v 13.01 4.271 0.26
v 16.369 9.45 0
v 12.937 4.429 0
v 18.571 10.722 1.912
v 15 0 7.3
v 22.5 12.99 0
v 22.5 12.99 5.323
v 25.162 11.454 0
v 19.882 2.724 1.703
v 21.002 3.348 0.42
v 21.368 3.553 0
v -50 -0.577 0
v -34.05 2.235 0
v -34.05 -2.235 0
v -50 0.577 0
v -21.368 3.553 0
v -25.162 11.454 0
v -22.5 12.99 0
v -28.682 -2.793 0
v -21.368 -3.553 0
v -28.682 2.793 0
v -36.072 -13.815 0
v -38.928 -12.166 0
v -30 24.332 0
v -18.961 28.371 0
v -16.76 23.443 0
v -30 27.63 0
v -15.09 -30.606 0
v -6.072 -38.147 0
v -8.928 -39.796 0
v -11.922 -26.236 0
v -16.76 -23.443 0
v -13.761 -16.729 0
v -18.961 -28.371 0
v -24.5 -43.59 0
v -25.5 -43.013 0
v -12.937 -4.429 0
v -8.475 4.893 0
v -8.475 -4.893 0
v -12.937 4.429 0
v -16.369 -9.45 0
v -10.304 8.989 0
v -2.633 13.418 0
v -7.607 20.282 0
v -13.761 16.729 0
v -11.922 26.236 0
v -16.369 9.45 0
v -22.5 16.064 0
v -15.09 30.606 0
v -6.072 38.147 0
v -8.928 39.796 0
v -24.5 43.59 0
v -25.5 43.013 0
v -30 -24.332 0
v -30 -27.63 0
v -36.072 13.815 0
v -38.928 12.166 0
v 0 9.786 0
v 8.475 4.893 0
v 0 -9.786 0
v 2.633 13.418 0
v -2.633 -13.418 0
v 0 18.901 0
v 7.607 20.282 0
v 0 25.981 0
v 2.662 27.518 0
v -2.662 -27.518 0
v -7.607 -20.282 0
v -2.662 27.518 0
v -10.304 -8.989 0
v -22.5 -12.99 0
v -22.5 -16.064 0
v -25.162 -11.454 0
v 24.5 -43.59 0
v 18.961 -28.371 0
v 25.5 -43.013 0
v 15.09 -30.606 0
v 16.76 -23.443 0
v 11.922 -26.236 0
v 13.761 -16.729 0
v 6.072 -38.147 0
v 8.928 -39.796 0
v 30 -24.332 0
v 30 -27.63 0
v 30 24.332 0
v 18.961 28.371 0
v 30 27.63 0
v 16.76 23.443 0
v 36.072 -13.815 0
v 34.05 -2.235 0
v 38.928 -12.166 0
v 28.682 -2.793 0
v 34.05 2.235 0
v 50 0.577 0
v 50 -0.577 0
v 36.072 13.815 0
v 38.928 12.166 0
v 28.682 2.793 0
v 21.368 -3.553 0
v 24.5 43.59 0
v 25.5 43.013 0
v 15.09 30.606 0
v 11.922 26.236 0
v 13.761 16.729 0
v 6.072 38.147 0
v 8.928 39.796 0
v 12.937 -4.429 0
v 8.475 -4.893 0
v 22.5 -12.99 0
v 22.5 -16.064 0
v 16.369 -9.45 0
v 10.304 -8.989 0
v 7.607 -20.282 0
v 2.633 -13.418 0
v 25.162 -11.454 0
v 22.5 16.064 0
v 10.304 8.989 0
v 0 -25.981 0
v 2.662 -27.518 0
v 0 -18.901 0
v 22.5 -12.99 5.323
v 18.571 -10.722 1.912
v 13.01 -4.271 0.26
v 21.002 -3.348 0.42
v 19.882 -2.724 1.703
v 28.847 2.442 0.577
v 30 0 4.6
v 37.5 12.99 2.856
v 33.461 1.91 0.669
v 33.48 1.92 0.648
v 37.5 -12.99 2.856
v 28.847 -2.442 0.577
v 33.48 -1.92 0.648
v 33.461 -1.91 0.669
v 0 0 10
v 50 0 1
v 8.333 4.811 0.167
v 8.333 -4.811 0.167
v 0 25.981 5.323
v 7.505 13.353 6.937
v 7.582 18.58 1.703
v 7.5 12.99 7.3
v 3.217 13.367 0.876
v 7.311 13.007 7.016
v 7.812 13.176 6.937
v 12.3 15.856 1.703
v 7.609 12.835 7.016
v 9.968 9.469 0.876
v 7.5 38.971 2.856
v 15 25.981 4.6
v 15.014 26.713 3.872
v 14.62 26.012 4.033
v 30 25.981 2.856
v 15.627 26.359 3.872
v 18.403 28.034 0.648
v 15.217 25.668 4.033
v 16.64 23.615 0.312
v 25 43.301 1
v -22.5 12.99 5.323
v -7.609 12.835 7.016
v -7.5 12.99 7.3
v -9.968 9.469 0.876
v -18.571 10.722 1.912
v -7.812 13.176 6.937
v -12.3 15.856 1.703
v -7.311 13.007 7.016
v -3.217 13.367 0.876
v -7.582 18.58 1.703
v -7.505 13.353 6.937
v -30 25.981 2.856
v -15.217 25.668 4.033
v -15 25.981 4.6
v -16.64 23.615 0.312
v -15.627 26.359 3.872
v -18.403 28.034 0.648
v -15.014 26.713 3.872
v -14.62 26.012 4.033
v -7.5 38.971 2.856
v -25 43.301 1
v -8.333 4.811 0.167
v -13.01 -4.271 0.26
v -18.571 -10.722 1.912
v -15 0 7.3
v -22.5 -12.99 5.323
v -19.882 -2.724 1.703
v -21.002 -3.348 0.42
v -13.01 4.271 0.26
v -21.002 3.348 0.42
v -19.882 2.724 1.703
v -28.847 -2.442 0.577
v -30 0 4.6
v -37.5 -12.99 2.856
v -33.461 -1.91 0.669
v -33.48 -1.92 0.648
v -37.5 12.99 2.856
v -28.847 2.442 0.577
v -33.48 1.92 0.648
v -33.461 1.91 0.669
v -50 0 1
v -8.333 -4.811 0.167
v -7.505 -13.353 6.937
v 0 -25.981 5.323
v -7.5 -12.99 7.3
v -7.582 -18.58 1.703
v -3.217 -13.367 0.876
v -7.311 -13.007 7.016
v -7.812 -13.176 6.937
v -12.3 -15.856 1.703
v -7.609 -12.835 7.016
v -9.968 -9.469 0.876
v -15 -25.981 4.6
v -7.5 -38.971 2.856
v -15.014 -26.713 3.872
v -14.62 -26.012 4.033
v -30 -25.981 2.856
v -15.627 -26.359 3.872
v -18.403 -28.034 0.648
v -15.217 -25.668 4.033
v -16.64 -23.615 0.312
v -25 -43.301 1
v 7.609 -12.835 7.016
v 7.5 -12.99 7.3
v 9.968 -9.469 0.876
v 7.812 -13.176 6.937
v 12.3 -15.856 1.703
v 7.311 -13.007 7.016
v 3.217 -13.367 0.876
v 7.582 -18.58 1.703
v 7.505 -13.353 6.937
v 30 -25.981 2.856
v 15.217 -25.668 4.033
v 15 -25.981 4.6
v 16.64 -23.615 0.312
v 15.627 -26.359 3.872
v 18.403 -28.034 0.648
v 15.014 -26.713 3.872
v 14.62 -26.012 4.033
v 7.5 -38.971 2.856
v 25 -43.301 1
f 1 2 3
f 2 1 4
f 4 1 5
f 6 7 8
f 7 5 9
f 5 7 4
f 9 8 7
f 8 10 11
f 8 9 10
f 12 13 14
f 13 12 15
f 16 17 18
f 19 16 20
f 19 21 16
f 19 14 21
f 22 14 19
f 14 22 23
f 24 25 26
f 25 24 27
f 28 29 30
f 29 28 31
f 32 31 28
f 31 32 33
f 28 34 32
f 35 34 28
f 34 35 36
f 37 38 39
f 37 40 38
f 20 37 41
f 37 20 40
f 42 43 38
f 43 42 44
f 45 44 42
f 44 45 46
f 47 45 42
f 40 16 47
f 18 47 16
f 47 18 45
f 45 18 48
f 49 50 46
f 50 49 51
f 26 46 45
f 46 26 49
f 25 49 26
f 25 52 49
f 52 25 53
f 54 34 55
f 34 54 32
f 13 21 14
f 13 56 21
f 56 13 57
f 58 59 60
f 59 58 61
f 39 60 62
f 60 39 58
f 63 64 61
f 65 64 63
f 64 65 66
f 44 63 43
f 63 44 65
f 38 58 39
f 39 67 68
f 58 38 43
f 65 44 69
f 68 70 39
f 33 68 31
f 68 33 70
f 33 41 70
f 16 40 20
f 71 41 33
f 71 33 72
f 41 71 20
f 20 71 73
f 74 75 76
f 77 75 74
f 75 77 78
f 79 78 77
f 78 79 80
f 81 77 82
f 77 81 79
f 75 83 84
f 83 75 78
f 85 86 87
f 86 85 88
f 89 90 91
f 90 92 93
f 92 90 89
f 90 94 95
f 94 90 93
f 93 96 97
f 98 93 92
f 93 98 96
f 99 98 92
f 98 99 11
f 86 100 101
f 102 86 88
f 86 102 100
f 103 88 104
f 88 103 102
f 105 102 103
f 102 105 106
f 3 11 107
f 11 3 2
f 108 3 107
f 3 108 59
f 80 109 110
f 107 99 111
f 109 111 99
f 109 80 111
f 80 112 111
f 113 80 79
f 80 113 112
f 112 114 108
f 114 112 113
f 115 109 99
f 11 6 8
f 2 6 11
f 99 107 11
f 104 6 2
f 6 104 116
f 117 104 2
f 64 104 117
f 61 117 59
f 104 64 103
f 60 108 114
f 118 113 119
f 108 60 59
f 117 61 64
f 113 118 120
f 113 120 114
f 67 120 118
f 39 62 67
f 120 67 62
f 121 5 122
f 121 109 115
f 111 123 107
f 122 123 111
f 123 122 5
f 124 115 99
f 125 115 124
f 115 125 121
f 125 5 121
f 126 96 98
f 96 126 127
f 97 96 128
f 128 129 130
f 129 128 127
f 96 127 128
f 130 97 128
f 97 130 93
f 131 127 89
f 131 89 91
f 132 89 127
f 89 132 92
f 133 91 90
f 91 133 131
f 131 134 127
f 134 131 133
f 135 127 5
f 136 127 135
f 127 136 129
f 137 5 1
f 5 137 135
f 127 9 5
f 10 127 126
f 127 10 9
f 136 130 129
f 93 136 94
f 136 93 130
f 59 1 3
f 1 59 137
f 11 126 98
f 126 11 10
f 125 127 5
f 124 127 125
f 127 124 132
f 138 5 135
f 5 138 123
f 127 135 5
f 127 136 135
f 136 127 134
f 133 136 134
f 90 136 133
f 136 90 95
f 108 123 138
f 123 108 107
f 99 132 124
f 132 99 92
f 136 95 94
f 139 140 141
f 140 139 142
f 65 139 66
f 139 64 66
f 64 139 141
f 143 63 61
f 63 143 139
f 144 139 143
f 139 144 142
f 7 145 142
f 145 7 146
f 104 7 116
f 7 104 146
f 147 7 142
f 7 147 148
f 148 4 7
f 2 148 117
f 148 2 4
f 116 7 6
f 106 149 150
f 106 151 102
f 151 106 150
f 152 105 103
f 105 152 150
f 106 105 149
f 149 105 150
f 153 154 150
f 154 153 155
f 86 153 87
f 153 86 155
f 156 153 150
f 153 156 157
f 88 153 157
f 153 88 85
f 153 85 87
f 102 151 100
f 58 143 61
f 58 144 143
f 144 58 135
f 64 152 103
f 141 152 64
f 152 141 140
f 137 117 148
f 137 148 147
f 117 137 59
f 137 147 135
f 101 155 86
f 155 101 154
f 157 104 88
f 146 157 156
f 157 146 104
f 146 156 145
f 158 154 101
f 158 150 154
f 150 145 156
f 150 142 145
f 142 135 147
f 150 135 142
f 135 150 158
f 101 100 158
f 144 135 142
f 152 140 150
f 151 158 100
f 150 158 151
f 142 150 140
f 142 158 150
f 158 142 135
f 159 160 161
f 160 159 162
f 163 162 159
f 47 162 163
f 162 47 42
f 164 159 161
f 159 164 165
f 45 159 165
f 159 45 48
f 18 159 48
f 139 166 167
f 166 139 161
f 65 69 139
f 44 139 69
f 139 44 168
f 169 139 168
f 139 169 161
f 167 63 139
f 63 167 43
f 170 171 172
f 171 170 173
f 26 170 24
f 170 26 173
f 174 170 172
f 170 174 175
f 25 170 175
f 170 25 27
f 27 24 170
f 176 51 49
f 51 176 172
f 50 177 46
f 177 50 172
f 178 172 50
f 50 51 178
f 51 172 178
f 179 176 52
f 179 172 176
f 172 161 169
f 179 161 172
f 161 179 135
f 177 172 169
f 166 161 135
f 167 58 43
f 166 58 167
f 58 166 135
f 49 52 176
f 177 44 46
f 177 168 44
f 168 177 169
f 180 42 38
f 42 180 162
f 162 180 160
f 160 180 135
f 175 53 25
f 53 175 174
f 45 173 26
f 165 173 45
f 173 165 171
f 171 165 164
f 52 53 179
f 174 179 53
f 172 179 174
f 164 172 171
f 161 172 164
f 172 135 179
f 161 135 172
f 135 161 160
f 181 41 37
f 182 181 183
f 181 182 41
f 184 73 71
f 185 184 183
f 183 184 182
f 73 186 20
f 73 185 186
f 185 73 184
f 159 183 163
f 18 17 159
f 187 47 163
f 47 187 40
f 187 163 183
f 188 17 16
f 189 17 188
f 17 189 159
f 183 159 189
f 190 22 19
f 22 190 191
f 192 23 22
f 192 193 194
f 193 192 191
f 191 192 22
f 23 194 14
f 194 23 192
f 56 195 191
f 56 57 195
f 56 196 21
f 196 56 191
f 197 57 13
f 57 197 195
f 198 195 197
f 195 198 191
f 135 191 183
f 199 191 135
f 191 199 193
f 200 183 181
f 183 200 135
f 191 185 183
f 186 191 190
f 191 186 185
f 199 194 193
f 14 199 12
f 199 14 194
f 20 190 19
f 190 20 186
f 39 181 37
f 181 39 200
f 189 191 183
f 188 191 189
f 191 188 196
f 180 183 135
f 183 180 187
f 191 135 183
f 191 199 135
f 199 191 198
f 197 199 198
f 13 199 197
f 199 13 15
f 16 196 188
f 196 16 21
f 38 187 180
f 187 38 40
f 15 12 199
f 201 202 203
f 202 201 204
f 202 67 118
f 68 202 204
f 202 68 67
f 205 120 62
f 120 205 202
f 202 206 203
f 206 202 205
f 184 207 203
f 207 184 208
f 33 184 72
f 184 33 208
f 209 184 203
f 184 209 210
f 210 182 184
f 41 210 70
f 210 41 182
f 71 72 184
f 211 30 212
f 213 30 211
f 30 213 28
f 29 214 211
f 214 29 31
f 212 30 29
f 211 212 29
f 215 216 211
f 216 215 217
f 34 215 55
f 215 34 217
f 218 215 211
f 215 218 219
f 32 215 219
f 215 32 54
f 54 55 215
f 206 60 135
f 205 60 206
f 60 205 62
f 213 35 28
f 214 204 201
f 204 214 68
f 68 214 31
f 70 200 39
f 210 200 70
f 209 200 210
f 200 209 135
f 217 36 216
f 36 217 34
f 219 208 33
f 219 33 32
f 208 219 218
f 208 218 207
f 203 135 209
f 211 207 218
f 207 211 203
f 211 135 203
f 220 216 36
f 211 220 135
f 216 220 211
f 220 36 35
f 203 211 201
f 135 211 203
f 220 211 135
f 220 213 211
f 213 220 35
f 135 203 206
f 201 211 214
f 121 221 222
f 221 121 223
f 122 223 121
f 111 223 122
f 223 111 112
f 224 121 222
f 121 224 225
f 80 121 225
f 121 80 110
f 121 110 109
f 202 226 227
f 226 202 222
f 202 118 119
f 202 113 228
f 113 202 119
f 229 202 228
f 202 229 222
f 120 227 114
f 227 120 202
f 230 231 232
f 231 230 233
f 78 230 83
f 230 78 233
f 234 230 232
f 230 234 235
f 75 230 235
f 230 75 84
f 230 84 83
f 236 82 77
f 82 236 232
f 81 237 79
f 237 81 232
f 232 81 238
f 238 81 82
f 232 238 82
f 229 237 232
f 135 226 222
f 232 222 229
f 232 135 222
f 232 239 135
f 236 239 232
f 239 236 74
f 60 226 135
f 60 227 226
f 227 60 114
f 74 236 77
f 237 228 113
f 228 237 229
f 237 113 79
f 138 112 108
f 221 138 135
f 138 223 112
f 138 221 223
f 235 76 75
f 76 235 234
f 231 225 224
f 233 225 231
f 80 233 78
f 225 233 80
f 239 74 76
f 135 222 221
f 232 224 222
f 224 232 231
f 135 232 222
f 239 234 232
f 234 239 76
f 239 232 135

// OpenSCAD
// Snowflake generator

module flake(radius, base) {
  for (i = [0 : 5]) {
    spike3([0, 0], 60 * i, radius, base);
  }
}

module spike3(pos, dir, len, side) {
  echo("Arm:", pos, len, side);
  spike(pos, dir, len, side);
  assign(child = pos + len * 0.3 * unit(dir)) {
    spike(child, dir + 60, len * 0.2, side * 0.7);
    spike(child, dir - 60, len * 0.2, side * 0.7);
  }
  assign(child = pos + len * 0.6 * unit(dir)) {
    spike2(child, dir + 60, len * 0.3, side * 0.4);
    spike2(child, dir - 60, len * 0.3, side * 0.4);
  }
}

// Recursion not working????
module spike2(pos, dir, len, side) {
  echo("Arm2:", pos, len, side);
  spike(pos, dir, len, side);
  assign(child = pos + len * 0.5 * unit(dir)) {
    spike(child, dir + 60, len * 0.3, side * 0.5);
    spike(child, dir - 60, len * 0.3, side * 0.5);
  }
}

module spike(pos, dir, len, side) {
  // Unit triangle extended 1 unit along x axis.
  //
  //     2---3   x
  //    / \ /   /
  //   1---0   -->-y

  translate([pos[0], pos[1], 0])
    rotate(dir, v=[0, 0, 1])
      scale([len, side, side])
  polyhedron(
    points=[
      [0, -0.5, 0], [0, 0.5, 0], [0, 0, sin(60)], [1, 0, 0]
    ],
    triangles=[
      [0, 1, 2], [0, 2, 3], [0, 3, 1], [1, 3, 2]
    ]
  );
}

MAX_HEIGHT = 10;
MIN_HEIGHT = 1;
RADIUS = 50;

module flake2(radius, base) {
  for (i = [0 : 5]) {
    hex3([0, 0], 60 * i, radius, base);
  }
}

module hex3(pos, dir, len, side) {
  line(pos, dir, len);
  assign(child = pos + len * 0.3 * unit(dir)) {
    line(child, dir + 60, len * 0.3);
    line(child, dir - 60, len * 0.3);
  }
  assign(child = pos + len * 0.6 * unit(dir)) {
    line(child, dir + 60, len * 0.3);
    line(child, dir - 60, len * 0.3);
  }
}

// Draw a wedge-shaped line scaled to gradient from center.
module line(pos, dir, len) {
  // Unit triangle extended 1 unit along x axis.
  //           5
  //          / \
  //     2   4-- 3
  //    / \
  //   1---0
  h1 = weighted(dist(pos) / RADIUS, MAX_HEIGHT, MIN_HEIGHT);
  s1 = h1 / sin(60);
  pos2 = pos + len * unit(dir);
  h2 = weighted(dist(pos2) / RADIUS, MAX_HEIGHT, MIN_HEIGHT);
  s2 = h2 / sin(60);
  translate([pos[0], pos[1], 0])
    rotate(dir, v=[0, 0, 1])
  polyhedron(
    points=[
      [0, -s1 / 2, 0], [0, s1 / 2, 0], [0, 0, h1],
      [len, -s2 / 2, 0], [len, s2 / 2, 0], [len, 0, h2]
    ],
    triangles=[
      [0, 1, 2],
      [0, 2, 5], [0, 5, 3],
      [0, 3, 4], [0, 4, 1],
      [1, 4, 5], [1, 5, 2],
      [3, 5, 4]
    ]
  );
}

function unit(dir) = [cos(dir), sin(dir)];
function dist(pos) = sqrt(pos[0]*pos[0] + pos[1]*pos[1]);
function weighted(f, x0, x1) = x0 * (1 - f) + x1 * f;

//spike([0, 0], 0, 50, 10);
//spike([0, 0], 60, 50, 10);
//spike2([0, 0], 60, 50, 10);
//spike3([0, 0], 60, 50, 10);
//flake(50, 10);
//line([0, 0], 0, 50);
//line([0, 0], 60, 25);
//hex3([0, 0], 60, 50, 10);
flake2(50, 10);
